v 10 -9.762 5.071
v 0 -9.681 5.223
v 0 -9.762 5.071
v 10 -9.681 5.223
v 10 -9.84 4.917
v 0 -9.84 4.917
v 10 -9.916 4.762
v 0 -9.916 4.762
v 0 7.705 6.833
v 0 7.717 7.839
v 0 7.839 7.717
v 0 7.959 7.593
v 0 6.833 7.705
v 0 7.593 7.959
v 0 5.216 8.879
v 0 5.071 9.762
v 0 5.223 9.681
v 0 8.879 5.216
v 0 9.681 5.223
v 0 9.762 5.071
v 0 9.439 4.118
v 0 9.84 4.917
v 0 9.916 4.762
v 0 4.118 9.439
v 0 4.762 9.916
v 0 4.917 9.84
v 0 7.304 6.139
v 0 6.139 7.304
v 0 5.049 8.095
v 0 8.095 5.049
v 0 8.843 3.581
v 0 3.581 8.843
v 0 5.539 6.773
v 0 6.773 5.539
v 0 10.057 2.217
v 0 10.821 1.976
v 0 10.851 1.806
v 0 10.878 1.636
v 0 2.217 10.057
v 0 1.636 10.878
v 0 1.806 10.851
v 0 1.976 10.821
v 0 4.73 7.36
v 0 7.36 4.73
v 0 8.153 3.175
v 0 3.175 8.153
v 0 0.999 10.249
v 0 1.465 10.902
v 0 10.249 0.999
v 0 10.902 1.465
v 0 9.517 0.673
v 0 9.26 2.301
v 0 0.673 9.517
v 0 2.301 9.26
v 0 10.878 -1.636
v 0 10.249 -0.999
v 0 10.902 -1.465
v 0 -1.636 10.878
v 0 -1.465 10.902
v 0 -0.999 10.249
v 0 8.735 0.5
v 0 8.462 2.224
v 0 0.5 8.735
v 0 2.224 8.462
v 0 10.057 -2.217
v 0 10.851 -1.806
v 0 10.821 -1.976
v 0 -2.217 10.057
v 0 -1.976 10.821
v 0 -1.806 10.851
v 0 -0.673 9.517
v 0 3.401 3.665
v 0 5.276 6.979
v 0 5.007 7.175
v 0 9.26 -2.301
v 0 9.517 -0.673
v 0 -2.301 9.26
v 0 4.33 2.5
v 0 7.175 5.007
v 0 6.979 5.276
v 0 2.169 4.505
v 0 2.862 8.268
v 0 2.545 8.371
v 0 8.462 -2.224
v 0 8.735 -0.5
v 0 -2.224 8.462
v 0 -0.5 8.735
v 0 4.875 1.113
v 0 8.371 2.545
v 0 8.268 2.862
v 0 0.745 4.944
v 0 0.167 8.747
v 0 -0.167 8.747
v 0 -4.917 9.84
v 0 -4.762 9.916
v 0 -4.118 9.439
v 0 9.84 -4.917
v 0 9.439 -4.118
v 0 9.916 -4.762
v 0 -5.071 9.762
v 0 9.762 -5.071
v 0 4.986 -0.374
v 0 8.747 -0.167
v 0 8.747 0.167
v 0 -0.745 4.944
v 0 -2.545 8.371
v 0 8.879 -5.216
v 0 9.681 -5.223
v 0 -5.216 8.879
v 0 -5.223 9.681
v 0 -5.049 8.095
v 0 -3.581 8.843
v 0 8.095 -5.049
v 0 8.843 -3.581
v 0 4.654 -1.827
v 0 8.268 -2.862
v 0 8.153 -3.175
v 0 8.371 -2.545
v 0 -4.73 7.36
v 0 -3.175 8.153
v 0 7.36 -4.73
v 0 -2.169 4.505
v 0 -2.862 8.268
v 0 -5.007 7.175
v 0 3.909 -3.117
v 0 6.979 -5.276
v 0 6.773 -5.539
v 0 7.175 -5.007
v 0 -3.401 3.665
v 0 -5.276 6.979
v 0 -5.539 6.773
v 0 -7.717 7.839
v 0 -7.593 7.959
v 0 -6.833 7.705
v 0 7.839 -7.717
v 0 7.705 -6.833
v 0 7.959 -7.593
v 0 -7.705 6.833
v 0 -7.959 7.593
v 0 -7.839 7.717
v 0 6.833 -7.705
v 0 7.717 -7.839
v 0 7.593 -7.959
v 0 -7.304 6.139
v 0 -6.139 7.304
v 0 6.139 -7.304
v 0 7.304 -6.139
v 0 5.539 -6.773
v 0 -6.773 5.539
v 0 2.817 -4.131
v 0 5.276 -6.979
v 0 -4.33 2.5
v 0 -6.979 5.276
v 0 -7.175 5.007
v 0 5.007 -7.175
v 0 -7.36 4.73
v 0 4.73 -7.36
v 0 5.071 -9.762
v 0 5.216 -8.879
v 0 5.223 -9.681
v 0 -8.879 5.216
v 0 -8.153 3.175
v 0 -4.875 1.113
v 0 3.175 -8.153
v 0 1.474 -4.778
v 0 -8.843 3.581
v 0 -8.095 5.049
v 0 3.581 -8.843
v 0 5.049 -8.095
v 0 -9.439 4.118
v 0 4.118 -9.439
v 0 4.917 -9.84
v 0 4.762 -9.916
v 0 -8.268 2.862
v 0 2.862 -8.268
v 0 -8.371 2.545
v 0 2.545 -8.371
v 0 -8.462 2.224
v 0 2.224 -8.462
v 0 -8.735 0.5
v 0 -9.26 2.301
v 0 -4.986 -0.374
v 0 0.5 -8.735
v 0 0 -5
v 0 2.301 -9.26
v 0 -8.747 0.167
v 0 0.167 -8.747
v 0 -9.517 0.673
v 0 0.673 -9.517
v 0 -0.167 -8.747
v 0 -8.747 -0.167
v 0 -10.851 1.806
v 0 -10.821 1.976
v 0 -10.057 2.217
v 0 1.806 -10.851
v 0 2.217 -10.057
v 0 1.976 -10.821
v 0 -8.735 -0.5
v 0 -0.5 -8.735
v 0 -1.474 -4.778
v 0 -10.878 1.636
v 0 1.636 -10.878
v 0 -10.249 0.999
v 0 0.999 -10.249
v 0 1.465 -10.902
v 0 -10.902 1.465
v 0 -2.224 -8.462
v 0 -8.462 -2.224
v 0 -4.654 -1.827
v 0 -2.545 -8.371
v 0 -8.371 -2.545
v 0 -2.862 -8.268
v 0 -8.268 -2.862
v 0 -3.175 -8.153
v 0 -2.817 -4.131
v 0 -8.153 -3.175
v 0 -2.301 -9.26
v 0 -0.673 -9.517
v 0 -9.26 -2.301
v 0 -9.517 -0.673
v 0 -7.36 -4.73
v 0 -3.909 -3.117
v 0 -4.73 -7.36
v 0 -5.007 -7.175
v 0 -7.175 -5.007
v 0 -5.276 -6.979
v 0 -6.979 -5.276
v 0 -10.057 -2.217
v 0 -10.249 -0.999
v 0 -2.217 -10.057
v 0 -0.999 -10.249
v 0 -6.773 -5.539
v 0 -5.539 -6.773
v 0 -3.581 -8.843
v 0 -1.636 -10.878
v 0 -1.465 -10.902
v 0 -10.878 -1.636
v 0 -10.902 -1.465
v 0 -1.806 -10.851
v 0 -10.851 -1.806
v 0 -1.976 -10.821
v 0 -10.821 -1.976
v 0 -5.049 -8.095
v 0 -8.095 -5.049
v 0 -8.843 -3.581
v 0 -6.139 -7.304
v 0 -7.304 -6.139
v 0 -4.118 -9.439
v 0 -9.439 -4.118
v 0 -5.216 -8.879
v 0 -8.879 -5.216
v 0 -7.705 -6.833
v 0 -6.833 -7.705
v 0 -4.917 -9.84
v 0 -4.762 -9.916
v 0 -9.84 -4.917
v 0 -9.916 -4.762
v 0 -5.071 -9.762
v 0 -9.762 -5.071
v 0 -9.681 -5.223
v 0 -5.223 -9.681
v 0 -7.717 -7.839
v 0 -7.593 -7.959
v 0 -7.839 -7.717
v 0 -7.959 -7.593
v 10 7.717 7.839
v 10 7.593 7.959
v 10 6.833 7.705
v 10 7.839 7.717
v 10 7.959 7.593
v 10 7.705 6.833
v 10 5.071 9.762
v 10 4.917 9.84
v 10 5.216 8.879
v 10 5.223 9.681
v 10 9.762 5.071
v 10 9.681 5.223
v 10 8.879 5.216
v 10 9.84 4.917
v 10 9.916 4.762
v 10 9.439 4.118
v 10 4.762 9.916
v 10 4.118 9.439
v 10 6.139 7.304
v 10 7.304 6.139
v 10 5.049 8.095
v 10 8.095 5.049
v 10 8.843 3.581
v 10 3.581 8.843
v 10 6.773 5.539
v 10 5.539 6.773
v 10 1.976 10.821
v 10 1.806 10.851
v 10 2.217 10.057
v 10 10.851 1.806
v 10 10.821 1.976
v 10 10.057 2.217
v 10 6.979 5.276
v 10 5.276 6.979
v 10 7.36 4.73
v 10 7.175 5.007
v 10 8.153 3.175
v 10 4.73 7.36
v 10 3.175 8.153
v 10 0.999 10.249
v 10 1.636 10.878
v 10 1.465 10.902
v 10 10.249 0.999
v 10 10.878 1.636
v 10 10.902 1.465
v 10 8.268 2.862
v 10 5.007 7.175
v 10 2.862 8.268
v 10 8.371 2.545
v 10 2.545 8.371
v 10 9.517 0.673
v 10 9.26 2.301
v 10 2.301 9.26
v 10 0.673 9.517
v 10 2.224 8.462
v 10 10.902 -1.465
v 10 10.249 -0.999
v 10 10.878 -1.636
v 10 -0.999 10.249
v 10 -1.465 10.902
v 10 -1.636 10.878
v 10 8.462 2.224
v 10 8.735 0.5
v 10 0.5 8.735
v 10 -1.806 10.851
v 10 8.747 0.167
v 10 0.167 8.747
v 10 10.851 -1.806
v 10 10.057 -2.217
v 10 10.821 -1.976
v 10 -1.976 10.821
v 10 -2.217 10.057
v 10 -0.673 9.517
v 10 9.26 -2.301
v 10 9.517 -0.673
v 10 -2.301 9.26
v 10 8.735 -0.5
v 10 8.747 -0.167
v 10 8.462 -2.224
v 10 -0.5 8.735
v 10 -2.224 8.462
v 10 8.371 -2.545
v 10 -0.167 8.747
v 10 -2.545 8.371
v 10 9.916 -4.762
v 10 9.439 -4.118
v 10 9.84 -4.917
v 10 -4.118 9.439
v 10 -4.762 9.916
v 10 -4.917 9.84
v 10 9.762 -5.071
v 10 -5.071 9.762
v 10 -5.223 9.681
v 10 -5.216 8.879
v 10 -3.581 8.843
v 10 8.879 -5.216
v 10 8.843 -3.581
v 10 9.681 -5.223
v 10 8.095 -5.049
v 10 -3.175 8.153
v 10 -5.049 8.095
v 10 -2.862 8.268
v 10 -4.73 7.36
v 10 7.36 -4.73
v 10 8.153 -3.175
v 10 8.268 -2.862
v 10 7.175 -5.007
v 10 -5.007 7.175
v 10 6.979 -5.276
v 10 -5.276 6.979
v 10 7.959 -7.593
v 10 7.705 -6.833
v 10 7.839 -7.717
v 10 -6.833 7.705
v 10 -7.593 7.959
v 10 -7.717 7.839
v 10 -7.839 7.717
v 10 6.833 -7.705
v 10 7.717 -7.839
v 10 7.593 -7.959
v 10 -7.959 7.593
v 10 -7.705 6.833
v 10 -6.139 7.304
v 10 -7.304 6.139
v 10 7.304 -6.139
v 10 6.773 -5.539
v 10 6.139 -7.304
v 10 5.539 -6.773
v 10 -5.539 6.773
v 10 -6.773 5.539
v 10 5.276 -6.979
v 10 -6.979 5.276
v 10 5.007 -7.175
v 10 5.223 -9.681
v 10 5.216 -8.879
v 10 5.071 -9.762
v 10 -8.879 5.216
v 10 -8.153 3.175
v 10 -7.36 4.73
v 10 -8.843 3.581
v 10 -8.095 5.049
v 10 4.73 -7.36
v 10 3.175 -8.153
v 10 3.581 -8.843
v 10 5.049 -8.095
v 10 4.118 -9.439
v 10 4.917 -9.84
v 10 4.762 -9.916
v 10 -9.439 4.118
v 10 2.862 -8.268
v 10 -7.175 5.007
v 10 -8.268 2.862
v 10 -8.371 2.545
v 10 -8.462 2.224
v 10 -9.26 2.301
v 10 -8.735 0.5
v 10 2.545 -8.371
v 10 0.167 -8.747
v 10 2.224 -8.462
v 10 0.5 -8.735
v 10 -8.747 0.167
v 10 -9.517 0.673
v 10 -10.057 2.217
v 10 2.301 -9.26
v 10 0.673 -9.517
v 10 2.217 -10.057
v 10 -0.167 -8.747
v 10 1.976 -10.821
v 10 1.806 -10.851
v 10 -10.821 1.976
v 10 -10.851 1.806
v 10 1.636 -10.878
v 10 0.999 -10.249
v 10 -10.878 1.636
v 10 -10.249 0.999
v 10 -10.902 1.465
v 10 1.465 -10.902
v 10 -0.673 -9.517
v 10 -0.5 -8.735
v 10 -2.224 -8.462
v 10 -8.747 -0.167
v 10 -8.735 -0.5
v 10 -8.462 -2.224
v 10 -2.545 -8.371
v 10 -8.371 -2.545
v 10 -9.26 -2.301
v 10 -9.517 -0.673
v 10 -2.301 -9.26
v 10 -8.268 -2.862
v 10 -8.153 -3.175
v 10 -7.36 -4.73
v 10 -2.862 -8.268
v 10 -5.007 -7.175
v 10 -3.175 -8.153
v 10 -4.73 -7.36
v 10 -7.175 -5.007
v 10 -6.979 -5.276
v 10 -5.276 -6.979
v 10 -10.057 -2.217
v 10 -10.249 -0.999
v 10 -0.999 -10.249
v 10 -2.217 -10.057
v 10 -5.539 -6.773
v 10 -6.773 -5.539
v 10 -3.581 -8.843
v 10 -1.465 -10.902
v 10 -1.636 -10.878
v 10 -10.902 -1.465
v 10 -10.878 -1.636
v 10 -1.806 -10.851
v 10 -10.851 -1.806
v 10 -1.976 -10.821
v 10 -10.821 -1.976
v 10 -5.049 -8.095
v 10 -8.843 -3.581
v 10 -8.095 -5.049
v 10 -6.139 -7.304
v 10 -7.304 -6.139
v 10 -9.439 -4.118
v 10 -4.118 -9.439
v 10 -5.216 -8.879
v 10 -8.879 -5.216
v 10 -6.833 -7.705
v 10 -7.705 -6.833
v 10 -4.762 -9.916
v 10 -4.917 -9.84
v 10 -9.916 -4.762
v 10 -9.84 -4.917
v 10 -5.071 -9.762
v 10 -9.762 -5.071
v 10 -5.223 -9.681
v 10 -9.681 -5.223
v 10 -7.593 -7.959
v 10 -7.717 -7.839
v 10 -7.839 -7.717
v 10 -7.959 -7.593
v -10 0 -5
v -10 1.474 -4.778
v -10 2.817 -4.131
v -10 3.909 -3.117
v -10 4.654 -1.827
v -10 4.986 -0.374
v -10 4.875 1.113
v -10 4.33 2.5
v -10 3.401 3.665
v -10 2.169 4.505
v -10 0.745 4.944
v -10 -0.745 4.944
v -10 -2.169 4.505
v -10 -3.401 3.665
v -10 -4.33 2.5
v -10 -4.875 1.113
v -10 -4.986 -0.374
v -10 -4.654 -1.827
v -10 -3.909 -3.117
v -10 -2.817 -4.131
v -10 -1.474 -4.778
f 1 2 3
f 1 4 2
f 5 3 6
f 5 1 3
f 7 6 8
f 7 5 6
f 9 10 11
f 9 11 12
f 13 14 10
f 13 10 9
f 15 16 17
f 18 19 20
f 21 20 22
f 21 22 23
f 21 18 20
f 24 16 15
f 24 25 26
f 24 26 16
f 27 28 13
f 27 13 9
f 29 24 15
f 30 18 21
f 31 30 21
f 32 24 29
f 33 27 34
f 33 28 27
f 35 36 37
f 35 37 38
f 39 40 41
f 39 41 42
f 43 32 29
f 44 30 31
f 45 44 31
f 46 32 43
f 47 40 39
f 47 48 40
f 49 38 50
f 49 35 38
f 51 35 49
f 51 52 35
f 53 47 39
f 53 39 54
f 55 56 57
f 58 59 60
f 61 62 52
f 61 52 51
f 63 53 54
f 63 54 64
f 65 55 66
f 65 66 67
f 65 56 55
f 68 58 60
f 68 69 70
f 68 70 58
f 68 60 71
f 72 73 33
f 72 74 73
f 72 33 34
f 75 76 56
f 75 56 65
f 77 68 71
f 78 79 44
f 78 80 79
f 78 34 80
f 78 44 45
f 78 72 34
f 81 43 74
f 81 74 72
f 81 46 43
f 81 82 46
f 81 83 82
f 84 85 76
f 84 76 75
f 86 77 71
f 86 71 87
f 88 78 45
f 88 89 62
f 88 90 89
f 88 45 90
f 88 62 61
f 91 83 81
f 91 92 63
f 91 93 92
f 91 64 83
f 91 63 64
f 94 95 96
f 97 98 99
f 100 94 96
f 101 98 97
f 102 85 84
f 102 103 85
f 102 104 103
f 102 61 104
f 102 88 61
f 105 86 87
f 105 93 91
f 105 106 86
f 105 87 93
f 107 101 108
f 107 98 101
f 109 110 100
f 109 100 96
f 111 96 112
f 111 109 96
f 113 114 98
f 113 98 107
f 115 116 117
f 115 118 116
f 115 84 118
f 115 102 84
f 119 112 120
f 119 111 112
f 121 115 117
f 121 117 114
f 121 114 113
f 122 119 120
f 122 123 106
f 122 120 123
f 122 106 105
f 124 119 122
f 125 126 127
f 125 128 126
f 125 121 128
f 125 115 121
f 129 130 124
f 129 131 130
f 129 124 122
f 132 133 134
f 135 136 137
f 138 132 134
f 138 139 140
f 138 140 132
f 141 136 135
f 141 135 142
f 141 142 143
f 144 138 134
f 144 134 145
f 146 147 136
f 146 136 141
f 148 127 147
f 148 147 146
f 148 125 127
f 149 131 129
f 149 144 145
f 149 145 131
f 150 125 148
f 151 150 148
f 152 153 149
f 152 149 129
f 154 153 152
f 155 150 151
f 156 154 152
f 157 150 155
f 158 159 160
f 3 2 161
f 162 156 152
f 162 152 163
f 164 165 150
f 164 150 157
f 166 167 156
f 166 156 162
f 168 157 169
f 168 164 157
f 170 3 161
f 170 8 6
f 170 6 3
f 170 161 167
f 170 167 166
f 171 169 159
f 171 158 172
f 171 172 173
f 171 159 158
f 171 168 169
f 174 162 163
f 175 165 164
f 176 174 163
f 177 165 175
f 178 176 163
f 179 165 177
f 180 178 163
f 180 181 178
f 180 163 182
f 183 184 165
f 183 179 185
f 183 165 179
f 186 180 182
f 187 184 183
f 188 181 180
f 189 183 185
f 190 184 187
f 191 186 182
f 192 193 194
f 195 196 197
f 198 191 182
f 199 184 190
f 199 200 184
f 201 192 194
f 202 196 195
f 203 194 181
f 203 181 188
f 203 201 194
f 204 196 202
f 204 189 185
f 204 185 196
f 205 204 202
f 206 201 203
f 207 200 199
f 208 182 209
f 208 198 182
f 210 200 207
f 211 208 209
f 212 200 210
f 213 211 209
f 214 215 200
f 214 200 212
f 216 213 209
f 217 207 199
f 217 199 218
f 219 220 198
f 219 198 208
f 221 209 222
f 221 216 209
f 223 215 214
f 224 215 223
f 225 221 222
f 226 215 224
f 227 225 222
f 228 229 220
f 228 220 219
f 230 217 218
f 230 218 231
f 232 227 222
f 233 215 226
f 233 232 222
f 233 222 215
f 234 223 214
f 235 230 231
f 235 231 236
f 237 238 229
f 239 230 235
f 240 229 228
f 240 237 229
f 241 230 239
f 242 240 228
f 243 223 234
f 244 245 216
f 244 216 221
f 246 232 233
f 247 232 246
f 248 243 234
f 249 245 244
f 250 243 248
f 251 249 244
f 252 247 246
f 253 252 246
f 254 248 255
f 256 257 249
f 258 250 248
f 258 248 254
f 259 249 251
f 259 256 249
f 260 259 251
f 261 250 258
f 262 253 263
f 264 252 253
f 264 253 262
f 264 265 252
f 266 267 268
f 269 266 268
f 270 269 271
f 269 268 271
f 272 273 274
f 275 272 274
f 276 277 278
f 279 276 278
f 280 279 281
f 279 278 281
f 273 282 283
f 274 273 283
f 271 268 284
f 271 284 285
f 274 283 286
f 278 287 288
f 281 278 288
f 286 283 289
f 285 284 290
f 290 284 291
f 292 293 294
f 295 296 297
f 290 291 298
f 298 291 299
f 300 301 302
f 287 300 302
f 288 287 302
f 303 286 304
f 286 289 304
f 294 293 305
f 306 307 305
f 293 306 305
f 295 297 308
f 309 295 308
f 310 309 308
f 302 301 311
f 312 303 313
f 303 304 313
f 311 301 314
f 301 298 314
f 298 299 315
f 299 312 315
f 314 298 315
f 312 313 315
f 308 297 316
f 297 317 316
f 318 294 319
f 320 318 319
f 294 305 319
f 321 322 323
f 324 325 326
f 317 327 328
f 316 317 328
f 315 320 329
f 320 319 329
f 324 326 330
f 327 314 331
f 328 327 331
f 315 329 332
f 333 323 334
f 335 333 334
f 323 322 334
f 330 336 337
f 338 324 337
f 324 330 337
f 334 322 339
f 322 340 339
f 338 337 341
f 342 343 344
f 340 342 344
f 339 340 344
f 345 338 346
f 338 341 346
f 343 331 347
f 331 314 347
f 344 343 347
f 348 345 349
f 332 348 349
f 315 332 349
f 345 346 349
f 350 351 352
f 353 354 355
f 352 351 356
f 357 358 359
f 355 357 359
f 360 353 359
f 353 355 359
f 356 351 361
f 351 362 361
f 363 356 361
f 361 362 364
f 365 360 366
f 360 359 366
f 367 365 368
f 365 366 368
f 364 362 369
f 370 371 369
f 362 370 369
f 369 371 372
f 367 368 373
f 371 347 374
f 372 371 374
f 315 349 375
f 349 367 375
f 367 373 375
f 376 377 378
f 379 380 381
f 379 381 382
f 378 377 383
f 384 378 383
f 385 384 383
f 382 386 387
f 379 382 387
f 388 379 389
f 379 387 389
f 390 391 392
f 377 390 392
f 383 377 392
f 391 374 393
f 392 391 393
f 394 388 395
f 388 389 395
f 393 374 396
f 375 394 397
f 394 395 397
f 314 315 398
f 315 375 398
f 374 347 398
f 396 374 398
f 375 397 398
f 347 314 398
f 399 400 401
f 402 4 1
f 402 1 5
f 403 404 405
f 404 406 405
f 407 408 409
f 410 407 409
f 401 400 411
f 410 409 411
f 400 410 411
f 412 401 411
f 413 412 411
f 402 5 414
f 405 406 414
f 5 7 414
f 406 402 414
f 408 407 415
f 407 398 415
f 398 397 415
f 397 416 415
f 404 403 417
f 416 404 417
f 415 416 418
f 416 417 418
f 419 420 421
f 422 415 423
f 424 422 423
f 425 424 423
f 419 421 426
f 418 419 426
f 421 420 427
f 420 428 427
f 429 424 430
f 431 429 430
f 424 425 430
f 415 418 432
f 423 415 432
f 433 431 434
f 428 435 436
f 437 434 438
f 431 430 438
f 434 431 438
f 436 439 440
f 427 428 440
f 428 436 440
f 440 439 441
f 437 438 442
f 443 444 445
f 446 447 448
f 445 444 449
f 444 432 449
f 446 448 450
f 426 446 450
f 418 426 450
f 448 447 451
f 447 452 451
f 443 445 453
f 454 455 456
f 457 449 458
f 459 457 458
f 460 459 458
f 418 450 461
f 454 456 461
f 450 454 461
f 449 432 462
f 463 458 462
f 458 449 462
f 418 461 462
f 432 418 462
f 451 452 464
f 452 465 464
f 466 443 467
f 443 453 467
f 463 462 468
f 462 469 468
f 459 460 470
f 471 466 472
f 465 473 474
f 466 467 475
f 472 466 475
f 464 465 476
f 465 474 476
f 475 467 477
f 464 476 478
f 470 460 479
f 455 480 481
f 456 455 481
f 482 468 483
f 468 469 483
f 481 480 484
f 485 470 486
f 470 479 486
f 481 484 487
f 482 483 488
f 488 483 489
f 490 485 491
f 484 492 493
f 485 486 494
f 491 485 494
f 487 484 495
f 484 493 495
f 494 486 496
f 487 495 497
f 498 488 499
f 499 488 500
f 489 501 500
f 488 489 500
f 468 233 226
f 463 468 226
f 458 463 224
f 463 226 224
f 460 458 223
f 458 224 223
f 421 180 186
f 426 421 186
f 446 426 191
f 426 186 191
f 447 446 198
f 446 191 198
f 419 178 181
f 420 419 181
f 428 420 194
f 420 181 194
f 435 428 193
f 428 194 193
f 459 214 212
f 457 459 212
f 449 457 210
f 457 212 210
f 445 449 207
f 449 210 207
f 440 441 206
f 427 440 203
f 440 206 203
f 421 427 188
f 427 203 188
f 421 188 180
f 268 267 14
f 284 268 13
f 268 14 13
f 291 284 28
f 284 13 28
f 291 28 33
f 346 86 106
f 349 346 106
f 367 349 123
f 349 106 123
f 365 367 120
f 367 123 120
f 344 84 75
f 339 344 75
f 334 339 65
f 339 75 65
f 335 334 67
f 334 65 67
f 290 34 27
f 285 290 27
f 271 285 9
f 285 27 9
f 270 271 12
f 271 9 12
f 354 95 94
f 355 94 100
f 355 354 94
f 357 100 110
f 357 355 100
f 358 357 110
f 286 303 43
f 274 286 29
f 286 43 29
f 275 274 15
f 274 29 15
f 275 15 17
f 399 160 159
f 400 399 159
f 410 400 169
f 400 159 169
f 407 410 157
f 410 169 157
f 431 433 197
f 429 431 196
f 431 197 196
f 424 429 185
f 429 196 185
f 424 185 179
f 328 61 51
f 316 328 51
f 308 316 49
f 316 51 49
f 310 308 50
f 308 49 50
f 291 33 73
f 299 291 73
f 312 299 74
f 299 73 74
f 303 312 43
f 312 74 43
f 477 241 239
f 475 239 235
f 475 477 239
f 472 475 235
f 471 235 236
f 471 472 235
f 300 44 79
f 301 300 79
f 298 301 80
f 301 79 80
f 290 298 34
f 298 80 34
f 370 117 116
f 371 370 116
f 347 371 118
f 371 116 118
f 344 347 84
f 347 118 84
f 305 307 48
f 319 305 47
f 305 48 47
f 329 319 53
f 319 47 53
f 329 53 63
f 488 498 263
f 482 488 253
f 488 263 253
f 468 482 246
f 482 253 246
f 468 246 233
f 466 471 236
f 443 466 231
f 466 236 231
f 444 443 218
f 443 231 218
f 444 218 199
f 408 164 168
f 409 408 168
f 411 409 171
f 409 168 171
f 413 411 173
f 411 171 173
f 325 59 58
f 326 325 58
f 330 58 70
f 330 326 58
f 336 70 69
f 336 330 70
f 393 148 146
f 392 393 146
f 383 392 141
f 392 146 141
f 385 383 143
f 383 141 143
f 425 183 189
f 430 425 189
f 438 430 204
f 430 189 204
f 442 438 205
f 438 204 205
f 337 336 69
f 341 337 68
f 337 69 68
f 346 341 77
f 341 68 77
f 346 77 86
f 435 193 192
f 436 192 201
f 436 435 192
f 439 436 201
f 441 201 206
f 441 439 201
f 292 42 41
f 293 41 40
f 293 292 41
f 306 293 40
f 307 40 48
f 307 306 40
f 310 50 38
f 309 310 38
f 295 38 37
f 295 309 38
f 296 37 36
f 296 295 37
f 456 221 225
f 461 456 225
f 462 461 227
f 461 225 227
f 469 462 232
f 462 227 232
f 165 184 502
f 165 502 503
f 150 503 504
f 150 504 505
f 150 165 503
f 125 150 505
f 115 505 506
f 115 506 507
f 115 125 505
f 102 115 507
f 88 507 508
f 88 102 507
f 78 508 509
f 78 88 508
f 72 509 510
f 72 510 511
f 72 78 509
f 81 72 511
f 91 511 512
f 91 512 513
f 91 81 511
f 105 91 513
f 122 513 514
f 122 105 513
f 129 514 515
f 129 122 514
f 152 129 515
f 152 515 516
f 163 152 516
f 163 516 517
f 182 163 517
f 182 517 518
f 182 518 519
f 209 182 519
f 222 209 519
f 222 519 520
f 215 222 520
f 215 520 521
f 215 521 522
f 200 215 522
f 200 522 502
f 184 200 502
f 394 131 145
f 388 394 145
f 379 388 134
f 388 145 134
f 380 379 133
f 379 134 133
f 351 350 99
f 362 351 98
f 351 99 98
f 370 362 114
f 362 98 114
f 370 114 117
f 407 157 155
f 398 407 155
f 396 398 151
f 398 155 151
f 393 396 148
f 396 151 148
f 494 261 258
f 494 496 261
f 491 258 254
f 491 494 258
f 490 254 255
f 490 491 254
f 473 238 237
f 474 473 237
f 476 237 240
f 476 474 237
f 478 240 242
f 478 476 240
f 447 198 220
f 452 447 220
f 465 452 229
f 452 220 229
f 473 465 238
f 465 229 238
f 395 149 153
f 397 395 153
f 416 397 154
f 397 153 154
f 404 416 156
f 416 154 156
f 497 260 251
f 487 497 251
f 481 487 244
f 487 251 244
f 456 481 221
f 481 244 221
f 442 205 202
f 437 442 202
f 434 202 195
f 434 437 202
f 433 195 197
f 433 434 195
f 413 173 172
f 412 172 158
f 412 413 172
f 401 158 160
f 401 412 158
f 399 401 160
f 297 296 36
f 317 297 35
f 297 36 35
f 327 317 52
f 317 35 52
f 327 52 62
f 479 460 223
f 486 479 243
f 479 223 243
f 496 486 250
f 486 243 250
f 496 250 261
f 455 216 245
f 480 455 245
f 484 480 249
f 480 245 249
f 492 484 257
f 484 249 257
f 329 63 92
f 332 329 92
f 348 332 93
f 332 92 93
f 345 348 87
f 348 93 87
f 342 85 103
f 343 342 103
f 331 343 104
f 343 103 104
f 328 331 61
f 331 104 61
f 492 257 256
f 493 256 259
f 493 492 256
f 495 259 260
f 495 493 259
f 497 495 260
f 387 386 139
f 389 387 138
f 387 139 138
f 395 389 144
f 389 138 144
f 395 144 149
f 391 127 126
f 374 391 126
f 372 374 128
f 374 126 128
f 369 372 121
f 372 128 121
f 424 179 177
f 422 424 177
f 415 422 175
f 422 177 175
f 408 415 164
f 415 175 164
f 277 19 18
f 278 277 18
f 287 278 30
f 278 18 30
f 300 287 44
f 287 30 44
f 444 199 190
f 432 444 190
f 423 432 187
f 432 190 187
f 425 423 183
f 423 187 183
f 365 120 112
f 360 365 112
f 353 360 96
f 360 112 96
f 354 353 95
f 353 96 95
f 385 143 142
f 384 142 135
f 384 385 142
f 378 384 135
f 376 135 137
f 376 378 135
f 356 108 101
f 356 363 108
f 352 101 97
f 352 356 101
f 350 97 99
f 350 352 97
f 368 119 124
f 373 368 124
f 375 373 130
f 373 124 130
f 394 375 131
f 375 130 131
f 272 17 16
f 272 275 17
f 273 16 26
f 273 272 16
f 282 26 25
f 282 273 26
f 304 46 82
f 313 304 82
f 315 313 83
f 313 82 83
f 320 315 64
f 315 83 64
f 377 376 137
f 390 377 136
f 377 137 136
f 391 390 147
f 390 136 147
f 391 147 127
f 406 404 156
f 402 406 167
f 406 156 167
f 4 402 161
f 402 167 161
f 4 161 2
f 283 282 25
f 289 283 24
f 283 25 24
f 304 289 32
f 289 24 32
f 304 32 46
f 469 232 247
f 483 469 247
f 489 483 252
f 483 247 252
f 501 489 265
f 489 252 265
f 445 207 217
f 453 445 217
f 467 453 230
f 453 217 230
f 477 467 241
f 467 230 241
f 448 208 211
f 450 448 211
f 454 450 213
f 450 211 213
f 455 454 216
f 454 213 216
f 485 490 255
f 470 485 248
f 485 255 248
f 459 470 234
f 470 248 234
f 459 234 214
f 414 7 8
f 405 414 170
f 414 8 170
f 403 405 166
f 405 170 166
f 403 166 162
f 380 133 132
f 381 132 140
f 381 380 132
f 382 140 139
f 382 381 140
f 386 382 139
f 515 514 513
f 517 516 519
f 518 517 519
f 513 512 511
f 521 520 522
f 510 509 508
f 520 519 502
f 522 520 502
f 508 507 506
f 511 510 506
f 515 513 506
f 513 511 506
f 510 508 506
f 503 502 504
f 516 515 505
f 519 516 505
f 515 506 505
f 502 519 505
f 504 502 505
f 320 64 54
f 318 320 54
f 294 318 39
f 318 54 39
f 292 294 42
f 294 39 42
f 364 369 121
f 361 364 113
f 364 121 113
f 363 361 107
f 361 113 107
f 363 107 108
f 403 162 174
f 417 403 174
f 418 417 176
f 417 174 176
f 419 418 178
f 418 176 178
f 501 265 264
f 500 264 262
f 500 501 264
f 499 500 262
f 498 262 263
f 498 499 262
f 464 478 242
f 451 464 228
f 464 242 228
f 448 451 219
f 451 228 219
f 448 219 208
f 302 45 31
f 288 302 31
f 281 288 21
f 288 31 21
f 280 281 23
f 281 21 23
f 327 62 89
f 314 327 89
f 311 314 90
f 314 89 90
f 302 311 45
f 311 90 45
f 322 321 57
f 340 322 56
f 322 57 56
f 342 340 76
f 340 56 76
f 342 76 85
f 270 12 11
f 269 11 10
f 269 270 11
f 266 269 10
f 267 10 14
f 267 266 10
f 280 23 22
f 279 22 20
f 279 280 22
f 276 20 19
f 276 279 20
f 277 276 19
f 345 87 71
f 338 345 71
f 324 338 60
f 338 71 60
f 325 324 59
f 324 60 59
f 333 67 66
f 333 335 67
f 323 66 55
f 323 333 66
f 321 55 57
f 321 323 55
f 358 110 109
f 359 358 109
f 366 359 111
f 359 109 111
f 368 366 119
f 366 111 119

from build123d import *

# Parameters (mm, degrees)
BASPROSKE_W     = 10
BASPROSKE_H     = 11
TOOTHCUT_DEPTH  = 19.493242009
TEETHCUTS_COUNT = 20
TEETHCUTS_ANGLE = 342
BORSKE_R        = 0.5
BORE_DEPTH      = 50.0000508
SKETCH_1_R      = 5
EXTRUDE_1_DEPTH = 20


with BuildPart() as part:
    # BasProSke → Base-Revolve (revolve)
    with BuildSketch(Plane(origin=(0, 0, 0), x_dir=(1, 0, 0), z_dir=(0, 1, 0)), mode=Mode.PRIVATE) as base_revolve_sk:
        with Locations((5, 5.5)):
            Rectangle(BASPROSKE_W, BASPROSKE_H)
    revolve(base_revolve_sk.sketch.rotate(Axis((-10, 0, 0), (1, 0, 0)), 180), axis=Axis((-10, 0, 0), (1, 0, 0)))

    # TooCutSke → ToothCut (cut, through all)
    with BuildSketch(Plane(origin=(0, 0, 0), x_dir=(0, 0, -1), z_dir=(1, 0, 0))):
        with BuildLine():
            ThreePointArc((0.499924007, 8.734705318), (0, 8.749), (-0.499924007, 8.734705318))
            ThreePointArc((-0.499924007, 8.734705318), (-0.824302243, 9.905497836), (-1.485192705, 10.924909509))
            ThreePointArc((-1.485192705, 10.924909509), (0, 11.0254), (1.485192705, 10.924909509))
            ThreePointArc((1.485192705, 10.924909509), (0.824302243, 9.905497836), (0.499924007, 8.734705318))
        make_face()
    toothcut = extrude(amount=TOOTHCUT_DEPTH, mode=Mode.SUBTRACT)

    # TeethCuts: ToothCut ×20 about axis
    teethcuts_axis = Axis((-10, 0, 0), (1, 0, 0))
    for i in range(1, TEETHCUTS_COUNT):
        add(toothcut.rotate(teethcuts_axis, i * TEETHCUTS_ANGLE / (TEETHCUTS_COUNT - 1)), mode=Mode.SUBTRACT)

    # BorSke → Bore (cut, symmetric)
    with BuildSketch(Plane(origin=(0, 0, 0), x_dir=(0, 0, -1), z_dir=(1, 0, 0))):
        with Locations(Location((0, 0, 0), (0, 0, 180))):
            Circle(BORSKE_R)
    extrude(amount=BORE_DEPTH, both=True, mode=Mode.SUBTRACT)

    # 草图1 → 凸台-拉伸1 (add)
    with BuildSketch(Plane(origin=(10, 0, 0), x_dir=(0, 0, -1), z_dir=(1, 0, 0))):
        Circle(SKETCH_1_R)
    extrude(amount=-EXTRUDE_1_DEPTH)


solid = part.part
